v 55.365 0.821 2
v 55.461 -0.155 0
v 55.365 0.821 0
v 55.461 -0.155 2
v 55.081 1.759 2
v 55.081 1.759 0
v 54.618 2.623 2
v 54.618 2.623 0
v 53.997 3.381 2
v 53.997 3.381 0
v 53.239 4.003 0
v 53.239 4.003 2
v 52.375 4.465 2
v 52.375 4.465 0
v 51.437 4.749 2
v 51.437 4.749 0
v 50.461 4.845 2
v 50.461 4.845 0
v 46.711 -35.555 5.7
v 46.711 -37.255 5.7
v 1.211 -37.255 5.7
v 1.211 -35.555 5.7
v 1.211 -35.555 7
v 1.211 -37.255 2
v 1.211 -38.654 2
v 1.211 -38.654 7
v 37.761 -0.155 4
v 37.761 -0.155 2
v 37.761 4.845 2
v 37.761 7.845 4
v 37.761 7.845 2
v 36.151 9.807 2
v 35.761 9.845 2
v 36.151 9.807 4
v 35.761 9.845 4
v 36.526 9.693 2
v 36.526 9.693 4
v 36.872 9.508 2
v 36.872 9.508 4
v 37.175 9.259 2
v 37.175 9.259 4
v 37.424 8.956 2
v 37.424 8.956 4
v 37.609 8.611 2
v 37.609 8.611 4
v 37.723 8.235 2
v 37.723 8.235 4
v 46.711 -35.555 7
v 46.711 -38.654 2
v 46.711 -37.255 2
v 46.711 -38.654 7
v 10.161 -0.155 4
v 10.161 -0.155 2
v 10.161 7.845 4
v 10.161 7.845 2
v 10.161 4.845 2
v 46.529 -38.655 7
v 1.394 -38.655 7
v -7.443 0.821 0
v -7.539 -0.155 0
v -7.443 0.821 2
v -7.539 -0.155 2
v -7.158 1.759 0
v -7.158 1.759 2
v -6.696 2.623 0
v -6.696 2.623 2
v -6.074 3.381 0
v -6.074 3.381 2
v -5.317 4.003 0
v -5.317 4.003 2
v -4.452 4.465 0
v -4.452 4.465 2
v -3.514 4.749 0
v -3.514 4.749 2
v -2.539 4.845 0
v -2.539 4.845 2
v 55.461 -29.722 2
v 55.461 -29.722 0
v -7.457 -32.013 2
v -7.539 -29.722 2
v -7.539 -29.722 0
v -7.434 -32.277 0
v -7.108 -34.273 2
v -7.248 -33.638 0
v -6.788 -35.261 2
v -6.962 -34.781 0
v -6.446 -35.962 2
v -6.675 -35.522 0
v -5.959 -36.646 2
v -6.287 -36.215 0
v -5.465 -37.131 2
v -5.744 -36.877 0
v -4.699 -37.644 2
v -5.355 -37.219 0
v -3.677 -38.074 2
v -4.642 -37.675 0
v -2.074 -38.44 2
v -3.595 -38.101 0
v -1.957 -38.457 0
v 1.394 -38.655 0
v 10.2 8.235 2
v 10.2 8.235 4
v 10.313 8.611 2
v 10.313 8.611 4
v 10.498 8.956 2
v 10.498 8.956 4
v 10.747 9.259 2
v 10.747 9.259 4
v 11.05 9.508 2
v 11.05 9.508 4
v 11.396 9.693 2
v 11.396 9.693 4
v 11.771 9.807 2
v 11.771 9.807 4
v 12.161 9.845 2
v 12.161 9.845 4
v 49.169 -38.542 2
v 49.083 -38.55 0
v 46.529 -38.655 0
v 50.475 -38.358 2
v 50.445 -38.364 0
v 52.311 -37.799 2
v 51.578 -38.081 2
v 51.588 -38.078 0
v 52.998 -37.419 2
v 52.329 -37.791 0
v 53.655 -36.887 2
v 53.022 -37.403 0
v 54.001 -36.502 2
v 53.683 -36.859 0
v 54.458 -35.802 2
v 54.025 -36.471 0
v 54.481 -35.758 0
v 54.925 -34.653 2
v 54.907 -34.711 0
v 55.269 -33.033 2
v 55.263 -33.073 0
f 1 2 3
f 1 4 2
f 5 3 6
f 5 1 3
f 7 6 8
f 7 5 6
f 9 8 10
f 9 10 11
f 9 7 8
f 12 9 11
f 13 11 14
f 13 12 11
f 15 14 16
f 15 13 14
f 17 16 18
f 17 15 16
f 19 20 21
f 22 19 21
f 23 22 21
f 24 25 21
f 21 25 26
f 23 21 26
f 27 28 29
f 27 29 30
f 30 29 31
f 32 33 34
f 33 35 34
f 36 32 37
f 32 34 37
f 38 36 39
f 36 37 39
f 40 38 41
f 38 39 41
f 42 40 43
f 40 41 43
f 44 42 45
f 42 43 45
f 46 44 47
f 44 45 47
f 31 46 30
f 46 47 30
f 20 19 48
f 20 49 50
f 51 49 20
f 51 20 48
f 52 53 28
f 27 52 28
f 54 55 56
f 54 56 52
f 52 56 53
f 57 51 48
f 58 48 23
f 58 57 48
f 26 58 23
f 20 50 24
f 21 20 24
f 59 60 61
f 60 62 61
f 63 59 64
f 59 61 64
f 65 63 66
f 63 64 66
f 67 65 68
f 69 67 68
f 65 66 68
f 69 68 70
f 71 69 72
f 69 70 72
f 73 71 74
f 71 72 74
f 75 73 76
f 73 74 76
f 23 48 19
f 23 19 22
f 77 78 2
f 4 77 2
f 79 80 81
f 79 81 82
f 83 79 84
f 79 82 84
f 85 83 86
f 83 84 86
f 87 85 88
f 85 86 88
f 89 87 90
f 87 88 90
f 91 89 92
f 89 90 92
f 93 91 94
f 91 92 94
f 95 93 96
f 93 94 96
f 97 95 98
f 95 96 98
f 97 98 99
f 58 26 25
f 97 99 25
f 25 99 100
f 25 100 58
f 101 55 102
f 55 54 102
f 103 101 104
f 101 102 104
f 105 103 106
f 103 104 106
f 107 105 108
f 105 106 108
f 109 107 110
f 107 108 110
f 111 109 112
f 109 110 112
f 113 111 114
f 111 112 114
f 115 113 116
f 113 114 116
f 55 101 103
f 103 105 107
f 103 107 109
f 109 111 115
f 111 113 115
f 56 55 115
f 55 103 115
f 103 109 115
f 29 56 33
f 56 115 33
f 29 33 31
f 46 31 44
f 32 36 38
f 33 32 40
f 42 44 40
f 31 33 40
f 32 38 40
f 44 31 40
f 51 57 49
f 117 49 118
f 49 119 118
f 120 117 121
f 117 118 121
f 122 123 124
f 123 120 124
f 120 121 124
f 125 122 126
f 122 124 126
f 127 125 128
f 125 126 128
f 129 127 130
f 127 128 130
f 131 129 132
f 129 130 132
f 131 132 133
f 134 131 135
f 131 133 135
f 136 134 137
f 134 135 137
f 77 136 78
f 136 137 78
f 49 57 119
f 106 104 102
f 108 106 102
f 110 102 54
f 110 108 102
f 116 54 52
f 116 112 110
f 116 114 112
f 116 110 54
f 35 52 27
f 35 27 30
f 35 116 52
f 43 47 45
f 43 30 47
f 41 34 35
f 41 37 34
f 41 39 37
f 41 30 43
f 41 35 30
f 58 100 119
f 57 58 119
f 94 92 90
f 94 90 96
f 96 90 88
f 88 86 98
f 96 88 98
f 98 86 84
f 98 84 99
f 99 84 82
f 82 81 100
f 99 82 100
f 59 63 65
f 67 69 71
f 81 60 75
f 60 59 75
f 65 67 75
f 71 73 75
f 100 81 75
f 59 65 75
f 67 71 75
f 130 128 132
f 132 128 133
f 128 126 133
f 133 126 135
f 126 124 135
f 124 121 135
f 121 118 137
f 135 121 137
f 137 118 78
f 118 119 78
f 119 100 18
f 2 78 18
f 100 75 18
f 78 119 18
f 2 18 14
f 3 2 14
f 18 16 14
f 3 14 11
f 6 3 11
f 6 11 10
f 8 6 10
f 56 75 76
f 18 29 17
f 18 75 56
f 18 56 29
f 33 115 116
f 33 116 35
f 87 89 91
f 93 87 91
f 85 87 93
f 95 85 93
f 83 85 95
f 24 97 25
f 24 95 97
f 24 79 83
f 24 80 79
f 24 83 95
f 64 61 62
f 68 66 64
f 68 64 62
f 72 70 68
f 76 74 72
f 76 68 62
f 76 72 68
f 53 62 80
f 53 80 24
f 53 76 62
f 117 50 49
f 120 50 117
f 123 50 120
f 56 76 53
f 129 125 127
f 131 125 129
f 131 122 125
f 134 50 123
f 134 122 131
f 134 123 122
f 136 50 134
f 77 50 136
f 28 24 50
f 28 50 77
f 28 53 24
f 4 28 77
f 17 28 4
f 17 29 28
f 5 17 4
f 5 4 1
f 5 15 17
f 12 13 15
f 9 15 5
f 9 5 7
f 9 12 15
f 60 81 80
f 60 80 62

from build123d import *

# Parameters (mm, degrees)
F0_W        = 63
F0_H        = 43.5
F1_DEPTH    = 2
F2_R        = 5
F3_W        = 27.6
F3_H        = 5
F4_DEPTH    = 2
F5_R        = 2
F6_DEPTH    = 5
F7_W        = 45.5
F7_H        = 1.3
F8_DEPTH    = 1.7
F9_T1_DEPTH = 46.6629509039


# Not quite as in the source:
# - a fillet or chamfer that OpenCascade refuses, or shapes differently, is made with other operations: its cross-section is extruded or revolved along the edge and cut away or added


with BuildPart() as f1:
    # F0 (on Top) → F1 (new body)
    with BuildSketch(Plane.XY):
        with Locations((23.961127311, -16.9047259986)):
            Rectangle(F0_W, F0_H)
    extrude(amount=F1_DEPTH)

    # F2
    f2_edges = [f1.edges().sort_by_distance(p)[0] for p in [
        (-7.538873, 4.845274, 1),
        (55.461127, 4.845274, 1),
    ]]
    fillet(f2_edges, radius=F2_R)

    # F3 (on face) → F4 (join)
    with BuildSketch(Plane.XY.offset(2)):
        with Locations((23.961127311, 7.3452740014)):
            Rectangle(F3_W, F3_H)
        Polygon((10.161127311, -0.1547259986), (23.961127311, -0.1547259986), (37.761127311, -0.1547259986), (37.761127311, 4.8452740014), (10.161127311, 4.8452740014), align=None)
    extrude(amount=F4_DEPTH)

    # F5
    f5_edges = [f1.edges().sort_by_distance(p)[0] for p in [
        (10.161127, 9.845274, 3),
        (37.761127, 9.845274, 3),
    ]]
    fillet(f5_edges, radius=F5_R)

    # F3 (on face) → F6 (join)
    with BuildSketch(Plane.XY.offset(2)):
        Polygon((1.211127311, -37.2547259986), (1.211127311, -38.6547259986), (23.961127311, -38.6547259986), (46.711127311, -38.6547259986), (46.711127311, -37.2547259986), align=None)
    extrude(amount=F6_DEPTH)

    # F7 (on face) → F8 (join)
    with BuildSketch(Plane(origin=(0, -37.2547259986, 0), x_dir=(-1, 0, 0), z_dir=(0, 1, 0))):
        with Locations((-23.961127311, 6.35)):
            Rectangle(F7_W, F7_H)
    extrude(amount=F8_DEPTH)

    # F9: fillet of radius 8.9325901808 on 2 edges, made by hand

    # F9_s2 → F9_t1 (cut)
    with BuildSketch(Plane.XY.offset(-22.331475452)):
        with BuildLine():
            add(Edge.make_bspline(
                [(46.5285371302, -38.6547259986), (55.461127311, -38.6547259986), (55.461127311, -29.7221358179)],
                knots=[0, 0, 0, 1, 1, 1], degree=2, weights=[1, 1.5, 1]))
            Line((55.461127311, -29.7221358179), (55.461127311, -38.6547259986))
            Line((55.461127311, -38.6547259986), (46.5285371302, -38.6547259986))
        make_face()
        with BuildLine():
            add(Edge.make_bspline(
                [(-7.538872689, -29.7221358179), (-7.538872689, -38.6547259986), (1.3937174918, -38.6547259986)],
                knots=[0, 0, 0, 1, 1, 1], degree=2, weights=[1, 1.5, 1]))
            Line((1.3937174918, -38.6547259986), (-7.538872689, -38.6547259986))
            Line((-7.538872689, -38.6547259986), (-7.538872689, -29.7221358179))
        make_face()
    extrude(amount=F9_T1_DEPTH, mode=Mode.SUBTRACT)


solid = f1.part
